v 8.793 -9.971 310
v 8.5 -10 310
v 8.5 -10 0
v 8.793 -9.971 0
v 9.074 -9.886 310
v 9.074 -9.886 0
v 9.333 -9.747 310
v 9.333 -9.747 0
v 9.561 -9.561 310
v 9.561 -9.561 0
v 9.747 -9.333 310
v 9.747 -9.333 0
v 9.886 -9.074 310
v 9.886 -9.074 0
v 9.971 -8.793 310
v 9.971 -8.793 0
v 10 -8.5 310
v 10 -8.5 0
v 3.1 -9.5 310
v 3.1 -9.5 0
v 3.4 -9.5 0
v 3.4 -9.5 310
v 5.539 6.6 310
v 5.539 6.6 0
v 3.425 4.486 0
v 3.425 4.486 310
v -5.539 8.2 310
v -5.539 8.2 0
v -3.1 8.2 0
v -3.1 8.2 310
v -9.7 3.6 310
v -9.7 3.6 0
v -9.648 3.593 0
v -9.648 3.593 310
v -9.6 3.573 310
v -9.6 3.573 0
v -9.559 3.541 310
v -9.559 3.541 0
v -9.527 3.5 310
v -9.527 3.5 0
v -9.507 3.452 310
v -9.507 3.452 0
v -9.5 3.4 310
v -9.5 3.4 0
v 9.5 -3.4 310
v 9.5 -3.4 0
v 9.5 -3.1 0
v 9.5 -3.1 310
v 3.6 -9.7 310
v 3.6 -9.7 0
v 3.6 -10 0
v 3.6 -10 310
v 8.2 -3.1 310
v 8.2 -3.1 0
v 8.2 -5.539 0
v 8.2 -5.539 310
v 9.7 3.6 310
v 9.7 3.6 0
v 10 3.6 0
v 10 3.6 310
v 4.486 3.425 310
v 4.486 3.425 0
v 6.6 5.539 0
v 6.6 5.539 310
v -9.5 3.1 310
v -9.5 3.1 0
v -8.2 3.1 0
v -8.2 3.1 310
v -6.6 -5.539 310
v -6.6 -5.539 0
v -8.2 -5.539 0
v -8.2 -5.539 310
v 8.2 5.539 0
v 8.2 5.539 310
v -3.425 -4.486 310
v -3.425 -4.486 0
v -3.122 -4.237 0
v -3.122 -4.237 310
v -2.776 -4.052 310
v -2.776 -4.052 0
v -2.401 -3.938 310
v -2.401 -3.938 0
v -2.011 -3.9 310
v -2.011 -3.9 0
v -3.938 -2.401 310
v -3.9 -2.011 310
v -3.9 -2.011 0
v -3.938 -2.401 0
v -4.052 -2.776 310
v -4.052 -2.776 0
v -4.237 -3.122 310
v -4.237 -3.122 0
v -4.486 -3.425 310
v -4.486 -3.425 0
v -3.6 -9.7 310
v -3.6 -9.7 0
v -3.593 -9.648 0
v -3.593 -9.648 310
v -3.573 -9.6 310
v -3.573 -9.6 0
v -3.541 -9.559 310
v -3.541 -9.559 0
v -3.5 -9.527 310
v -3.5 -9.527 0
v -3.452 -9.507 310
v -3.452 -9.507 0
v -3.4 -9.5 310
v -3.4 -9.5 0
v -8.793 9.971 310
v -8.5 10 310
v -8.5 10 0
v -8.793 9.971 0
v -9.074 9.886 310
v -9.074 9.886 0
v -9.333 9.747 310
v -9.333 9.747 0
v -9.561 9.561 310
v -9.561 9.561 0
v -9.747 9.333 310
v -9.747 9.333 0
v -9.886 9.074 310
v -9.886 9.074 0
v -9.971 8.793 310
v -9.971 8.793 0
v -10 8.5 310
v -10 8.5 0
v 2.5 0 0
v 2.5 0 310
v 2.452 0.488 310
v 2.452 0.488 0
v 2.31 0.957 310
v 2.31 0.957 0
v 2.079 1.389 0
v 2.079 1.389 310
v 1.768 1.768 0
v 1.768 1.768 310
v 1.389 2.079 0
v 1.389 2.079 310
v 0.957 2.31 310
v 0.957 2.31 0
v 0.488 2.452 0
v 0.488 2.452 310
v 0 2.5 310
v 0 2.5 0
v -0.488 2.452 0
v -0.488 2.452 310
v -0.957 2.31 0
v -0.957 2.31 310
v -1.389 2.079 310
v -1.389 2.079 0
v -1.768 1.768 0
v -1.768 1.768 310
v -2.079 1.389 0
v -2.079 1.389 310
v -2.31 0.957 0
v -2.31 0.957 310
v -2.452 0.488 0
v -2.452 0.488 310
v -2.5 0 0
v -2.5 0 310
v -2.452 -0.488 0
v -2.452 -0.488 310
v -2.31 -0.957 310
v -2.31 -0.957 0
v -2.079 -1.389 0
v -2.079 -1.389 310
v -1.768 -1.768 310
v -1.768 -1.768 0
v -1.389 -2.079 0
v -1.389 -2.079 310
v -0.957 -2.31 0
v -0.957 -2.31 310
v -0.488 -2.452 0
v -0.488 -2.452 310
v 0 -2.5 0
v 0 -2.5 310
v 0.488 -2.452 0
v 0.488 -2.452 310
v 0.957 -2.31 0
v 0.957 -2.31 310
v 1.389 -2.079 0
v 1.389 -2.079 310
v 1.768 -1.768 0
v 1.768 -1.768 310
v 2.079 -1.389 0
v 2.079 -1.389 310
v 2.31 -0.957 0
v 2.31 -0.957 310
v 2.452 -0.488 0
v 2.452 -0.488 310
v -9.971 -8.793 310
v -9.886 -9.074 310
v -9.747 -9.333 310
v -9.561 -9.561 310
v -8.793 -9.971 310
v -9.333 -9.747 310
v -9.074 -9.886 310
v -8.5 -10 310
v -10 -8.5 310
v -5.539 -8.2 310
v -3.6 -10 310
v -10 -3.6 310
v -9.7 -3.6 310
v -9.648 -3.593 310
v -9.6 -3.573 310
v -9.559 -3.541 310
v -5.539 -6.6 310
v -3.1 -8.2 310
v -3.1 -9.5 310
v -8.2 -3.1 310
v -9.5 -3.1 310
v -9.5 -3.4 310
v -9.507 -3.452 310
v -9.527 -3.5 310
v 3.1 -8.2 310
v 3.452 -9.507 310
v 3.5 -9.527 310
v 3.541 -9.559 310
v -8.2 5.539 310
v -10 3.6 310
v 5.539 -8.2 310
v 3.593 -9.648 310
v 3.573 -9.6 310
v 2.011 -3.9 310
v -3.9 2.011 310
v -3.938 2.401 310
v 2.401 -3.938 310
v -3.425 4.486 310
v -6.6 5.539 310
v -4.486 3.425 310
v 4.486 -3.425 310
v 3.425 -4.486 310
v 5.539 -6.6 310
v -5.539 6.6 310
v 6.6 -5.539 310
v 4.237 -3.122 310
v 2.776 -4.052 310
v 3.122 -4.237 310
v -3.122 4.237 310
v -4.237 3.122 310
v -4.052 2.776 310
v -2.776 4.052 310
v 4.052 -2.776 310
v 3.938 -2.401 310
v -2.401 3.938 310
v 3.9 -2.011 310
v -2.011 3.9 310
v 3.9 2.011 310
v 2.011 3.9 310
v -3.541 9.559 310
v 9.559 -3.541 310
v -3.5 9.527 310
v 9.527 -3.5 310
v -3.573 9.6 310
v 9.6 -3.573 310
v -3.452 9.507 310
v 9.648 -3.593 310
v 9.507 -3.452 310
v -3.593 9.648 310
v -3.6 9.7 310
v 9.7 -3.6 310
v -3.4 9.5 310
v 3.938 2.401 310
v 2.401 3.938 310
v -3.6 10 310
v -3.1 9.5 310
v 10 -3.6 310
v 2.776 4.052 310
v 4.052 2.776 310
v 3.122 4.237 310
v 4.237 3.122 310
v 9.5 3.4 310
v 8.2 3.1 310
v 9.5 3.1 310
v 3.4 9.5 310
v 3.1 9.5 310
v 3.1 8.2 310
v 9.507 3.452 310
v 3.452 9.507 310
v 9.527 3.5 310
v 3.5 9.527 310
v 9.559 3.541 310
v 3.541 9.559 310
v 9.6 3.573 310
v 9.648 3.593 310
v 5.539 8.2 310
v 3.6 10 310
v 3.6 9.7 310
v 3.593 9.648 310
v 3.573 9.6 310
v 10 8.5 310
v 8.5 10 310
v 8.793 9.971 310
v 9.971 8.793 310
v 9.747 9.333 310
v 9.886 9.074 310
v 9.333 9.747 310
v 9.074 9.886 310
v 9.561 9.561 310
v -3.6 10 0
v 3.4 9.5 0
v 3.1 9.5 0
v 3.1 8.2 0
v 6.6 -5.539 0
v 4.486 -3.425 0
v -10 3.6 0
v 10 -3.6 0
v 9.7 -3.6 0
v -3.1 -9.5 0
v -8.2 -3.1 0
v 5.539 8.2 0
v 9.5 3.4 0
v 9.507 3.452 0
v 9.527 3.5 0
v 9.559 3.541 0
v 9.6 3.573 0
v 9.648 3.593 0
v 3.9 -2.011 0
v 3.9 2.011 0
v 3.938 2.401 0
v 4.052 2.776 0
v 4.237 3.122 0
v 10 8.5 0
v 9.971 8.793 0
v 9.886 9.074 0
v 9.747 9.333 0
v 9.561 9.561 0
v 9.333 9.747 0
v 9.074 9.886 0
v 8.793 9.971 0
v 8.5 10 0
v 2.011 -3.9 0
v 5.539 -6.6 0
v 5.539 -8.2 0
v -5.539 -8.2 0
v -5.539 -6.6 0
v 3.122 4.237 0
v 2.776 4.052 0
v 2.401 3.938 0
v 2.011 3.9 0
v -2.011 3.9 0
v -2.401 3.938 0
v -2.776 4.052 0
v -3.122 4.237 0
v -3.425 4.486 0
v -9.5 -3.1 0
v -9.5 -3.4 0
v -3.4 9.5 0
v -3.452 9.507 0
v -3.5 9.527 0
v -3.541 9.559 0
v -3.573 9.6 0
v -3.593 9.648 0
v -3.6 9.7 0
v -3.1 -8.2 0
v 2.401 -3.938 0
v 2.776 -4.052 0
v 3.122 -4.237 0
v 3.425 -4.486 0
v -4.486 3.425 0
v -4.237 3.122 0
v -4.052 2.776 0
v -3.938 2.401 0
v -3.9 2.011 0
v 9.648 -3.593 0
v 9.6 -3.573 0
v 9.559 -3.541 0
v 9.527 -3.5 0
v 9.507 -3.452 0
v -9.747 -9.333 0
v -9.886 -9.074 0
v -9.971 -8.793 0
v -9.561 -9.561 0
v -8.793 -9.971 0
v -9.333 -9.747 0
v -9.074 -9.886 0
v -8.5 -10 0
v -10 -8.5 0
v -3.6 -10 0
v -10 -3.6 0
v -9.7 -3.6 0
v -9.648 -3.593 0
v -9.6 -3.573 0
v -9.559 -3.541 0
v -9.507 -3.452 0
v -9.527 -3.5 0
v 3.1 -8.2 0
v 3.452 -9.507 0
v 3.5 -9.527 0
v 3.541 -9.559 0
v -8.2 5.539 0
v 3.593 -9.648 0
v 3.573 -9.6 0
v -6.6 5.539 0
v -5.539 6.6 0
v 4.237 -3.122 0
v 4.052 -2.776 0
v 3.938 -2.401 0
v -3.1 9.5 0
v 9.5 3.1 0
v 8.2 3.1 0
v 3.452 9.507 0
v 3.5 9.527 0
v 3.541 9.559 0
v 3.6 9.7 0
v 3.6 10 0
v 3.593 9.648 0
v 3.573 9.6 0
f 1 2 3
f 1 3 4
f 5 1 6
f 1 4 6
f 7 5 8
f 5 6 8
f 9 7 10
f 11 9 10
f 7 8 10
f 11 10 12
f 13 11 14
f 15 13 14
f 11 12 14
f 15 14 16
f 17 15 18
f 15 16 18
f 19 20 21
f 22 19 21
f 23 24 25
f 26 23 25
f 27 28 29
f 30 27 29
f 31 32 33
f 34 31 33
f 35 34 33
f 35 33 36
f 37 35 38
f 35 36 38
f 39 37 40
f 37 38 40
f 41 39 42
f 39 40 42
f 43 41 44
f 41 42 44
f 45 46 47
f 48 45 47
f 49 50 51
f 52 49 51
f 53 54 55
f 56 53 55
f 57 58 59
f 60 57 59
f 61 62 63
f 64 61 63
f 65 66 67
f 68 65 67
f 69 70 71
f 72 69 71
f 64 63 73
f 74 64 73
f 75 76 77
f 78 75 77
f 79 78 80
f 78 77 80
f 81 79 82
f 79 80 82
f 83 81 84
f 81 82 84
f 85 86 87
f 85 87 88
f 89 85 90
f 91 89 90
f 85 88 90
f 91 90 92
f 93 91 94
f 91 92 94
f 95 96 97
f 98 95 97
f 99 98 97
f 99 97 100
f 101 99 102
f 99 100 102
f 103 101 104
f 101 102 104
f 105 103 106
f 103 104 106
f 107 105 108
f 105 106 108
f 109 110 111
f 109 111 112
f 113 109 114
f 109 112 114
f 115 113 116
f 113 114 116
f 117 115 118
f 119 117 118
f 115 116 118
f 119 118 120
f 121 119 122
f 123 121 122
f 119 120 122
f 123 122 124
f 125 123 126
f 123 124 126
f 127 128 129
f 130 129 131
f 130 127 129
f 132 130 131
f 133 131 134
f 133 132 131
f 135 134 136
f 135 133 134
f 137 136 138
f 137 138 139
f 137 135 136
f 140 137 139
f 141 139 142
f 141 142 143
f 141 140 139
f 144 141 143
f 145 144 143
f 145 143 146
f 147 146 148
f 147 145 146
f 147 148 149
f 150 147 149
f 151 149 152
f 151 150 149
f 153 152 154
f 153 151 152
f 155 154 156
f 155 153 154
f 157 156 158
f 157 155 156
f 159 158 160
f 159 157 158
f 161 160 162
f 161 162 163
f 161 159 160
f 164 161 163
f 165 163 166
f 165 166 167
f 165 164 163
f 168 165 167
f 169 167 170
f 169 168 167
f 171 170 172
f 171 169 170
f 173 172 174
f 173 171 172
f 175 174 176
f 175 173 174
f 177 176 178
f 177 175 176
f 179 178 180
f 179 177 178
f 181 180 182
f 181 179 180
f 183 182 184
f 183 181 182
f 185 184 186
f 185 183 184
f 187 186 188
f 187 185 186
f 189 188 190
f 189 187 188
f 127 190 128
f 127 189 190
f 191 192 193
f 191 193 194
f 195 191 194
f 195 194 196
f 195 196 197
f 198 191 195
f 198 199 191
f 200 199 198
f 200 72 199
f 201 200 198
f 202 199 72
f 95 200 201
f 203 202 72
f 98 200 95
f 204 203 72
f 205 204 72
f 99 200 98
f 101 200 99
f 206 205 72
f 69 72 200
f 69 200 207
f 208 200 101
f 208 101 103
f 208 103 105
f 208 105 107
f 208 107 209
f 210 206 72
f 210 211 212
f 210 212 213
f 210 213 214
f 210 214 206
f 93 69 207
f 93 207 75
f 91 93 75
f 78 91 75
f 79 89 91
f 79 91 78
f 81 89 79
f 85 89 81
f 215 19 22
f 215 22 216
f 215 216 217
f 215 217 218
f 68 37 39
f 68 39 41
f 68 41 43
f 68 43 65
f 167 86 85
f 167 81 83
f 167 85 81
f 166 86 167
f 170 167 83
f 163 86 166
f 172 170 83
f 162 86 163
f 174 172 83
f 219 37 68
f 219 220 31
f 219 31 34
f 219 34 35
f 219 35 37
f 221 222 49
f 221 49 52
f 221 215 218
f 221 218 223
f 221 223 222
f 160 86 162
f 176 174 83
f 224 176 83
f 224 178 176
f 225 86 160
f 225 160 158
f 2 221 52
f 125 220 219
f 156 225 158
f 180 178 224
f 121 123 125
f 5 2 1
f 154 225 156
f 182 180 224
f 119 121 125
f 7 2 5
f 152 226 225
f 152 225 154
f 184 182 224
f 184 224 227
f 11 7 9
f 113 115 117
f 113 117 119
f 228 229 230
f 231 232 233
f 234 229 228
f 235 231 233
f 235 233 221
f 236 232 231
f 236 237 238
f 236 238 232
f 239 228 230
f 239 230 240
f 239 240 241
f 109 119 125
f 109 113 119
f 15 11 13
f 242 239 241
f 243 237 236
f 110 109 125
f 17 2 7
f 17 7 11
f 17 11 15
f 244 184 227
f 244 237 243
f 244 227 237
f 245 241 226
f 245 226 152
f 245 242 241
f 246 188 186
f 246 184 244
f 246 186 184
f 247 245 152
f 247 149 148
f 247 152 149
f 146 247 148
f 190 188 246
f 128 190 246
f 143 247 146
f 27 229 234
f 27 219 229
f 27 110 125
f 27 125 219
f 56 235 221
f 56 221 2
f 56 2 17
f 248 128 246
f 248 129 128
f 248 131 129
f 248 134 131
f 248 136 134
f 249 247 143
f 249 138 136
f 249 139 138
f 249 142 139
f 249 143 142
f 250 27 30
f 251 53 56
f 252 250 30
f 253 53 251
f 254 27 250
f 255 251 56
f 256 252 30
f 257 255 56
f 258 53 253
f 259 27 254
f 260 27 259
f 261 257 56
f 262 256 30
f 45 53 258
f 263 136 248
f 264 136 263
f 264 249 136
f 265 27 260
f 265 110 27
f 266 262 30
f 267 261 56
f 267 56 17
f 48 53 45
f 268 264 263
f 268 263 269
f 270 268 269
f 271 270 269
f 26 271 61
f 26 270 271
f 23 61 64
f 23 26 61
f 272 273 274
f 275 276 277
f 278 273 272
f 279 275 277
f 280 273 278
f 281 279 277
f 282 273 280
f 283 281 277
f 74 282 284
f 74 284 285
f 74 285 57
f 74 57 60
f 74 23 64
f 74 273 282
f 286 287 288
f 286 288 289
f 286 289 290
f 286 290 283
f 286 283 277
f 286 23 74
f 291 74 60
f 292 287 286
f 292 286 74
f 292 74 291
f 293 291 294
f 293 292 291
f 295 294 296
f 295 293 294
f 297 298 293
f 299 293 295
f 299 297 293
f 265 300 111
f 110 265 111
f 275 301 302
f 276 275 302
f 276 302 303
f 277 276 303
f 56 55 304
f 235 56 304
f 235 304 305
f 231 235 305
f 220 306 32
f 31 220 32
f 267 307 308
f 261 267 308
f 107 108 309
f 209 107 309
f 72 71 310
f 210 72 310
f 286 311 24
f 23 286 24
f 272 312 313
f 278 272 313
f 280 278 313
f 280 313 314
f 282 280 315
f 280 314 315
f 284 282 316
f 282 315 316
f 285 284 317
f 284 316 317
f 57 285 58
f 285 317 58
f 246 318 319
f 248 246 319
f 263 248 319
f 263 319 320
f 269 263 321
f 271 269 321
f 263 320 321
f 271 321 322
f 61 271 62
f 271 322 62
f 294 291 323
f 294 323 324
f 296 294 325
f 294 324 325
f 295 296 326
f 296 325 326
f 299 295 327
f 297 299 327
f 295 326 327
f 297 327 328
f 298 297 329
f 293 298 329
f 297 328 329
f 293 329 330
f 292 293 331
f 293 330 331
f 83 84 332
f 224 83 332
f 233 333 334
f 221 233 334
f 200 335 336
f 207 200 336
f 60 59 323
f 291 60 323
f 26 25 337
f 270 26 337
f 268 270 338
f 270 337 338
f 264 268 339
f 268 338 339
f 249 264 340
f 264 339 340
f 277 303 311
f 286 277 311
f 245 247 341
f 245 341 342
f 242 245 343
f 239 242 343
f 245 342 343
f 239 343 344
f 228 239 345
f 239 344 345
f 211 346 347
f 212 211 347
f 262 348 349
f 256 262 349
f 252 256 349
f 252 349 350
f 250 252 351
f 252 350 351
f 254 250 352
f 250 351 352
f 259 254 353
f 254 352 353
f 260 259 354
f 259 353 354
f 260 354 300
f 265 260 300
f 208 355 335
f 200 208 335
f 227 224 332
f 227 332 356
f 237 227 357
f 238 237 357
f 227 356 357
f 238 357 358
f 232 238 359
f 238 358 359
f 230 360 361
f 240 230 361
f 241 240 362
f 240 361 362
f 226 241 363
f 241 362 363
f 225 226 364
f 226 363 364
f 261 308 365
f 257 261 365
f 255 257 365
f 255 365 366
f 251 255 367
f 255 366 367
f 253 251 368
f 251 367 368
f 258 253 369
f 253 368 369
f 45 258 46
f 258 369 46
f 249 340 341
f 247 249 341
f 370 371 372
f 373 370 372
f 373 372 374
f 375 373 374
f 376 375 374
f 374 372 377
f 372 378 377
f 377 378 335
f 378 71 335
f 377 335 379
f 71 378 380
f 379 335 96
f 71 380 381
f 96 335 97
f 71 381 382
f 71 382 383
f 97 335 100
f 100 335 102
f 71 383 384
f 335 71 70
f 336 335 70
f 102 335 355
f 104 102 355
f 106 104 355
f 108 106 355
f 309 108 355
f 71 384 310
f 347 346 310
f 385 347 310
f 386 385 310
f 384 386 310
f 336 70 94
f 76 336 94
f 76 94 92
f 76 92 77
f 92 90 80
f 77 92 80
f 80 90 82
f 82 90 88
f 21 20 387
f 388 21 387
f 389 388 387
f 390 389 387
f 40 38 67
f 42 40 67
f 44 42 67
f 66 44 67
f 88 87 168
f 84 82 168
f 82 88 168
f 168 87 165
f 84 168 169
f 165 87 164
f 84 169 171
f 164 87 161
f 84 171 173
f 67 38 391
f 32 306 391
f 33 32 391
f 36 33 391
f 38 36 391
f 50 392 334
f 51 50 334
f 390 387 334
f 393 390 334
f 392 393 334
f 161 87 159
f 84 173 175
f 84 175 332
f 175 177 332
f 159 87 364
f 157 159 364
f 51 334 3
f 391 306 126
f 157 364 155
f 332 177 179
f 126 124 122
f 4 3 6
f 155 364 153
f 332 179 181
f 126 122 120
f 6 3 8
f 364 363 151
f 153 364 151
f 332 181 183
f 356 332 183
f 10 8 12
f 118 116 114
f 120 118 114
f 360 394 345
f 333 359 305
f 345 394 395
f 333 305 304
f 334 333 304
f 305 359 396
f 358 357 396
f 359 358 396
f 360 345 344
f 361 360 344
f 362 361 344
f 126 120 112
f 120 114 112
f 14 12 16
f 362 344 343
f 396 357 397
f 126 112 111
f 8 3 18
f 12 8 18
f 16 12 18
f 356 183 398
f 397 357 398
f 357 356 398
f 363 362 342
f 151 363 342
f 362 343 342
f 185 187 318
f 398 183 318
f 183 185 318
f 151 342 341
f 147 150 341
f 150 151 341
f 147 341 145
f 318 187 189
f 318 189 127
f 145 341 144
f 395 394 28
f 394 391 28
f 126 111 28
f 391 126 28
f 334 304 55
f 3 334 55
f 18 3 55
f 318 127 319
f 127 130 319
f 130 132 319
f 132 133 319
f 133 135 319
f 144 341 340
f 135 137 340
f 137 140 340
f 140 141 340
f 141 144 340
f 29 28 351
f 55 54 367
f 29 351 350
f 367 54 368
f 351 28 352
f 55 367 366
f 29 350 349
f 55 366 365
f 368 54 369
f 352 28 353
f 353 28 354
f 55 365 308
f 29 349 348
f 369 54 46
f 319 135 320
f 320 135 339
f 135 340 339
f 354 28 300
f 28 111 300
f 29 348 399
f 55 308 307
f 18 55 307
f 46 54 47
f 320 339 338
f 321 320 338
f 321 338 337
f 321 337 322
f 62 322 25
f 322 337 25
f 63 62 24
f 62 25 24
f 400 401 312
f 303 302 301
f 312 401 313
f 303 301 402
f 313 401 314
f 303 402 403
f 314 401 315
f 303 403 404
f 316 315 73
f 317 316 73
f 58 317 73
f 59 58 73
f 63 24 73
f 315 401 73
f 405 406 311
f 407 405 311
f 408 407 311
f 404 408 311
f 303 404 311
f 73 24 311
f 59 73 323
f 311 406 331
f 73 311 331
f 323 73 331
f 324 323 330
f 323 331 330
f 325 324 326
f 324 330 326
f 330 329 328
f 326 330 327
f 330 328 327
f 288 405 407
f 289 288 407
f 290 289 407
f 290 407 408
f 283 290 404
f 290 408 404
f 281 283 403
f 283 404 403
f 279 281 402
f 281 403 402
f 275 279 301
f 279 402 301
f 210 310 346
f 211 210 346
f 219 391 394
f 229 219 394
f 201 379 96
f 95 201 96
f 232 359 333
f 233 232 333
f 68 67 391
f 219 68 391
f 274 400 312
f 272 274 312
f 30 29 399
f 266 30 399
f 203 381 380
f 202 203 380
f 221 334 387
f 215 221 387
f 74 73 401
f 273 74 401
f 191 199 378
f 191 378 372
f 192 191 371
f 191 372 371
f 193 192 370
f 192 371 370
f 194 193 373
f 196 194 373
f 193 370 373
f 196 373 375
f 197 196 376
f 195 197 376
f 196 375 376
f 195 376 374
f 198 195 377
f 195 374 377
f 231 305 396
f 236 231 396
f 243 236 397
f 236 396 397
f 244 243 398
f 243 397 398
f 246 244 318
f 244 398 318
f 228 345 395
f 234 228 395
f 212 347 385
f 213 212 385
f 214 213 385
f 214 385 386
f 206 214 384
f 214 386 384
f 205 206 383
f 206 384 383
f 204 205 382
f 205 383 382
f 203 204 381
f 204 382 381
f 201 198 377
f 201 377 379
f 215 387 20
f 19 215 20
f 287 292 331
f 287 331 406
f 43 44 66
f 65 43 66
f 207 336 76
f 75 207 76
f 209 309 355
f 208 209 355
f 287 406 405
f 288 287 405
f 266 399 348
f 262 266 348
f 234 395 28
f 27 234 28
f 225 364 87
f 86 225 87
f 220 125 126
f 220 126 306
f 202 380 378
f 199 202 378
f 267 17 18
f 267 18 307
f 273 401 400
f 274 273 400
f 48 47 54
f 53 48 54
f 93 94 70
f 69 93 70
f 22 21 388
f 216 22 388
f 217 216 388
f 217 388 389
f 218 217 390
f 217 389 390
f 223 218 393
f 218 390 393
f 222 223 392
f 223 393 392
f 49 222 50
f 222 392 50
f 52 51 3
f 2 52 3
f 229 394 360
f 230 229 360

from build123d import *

# Parameters (mm, degrees)
SKETCH1_R       = 2.5
EXTRUDE_1_DEPTH = 310


with BuildPart() as part:
    # Sketch1 → Бобышка-Вытянуть1 (new body)
    with BuildSketch(Plane.XY):
        with BuildLine():
            Line((0, 3.9), (-2.010912703, 3.9))
            ThreePointArc((-2.010912703, 3.9), (-2.776279568, 4.052240935), (-3.425126266, 4.485786438))
            Line((-3.425126266, 4.485786438), (-5.539339828, 6.6))
            Line((-5.539339828, 6.6), (-5.539339828, 8.2))
            Line((-5.539339828, 8.2), (-3.1, 8.2))
            Line((-3.1, 8.2), (-3.1, 9.5))
            Line((-3.1, 9.5), (-3.4, 9.5))
            ThreePointArc((-3.4, 9.5), (-3.541421356, 9.558578644), (-3.6, 9.7))
            Line((-3.6, 9.7), (-3.6, 10))
            Line((-3.6, 10), (-8.5, 10))
            ThreePointArc((-8.5, 10), (-9.560660172, 9.560660172), (-10, 8.5))
            Line((-10, 8.5), (-10, 3.6))
            Line((-10, 3.6), (-9.7, 3.6))
            ThreePointArc((-9.7, 3.6), (-9.558578644, 3.541421356), (-9.5, 3.4))
            Line((-9.5, 3.4), (-9.5, 3.1))
            Line((-9.5, 3.1), (-8.2, 3.1))
            Line((-8.2, 3.1), (-8.2, 5.539339828))
            Line((-8.2, 5.539339828), (-6.6, 5.539339828))
            Line((-6.6, 5.539339828), (-4.485786438, 3.425126266))
            ThreePointArc((-4.485786438, 3.425126266), (-4.052240935, 2.776279568), (-3.9, 2.010912703))
            Line((-3.9, 2.010912703), (-3.9, 0))
            Line((-3.9, 0), (-3.9, -2.010912703))
            ThreePointArc((-3.9, -2.010912703), (-4.052240935, -2.776279568), (-4.485786438, -3.425126266))
            Line((-4.485786438, -3.425126266), (-6.6, -5.539339828))
            Line((-6.6, -5.539339828), (-8.2, -5.539339828))
            Line((-8.2, -5.539339828), (-8.2, -3.1))
            Line((-8.2, -3.1), (-9.5, -3.1))
            Line((-9.5, -3.1), (-9.5, -3.4))
            ThreePointArc((-9.5, -3.4), (-9.558578644, -3.541421356), (-9.7, -3.6))
            Line((-9.7, -3.6), (-10, -3.6))
            Line((-10, -3.6), (-10, -8.5))
            ThreePointArc((-10, -8.5), (-9.560660172, -9.560660172), (-8.5, -10))
            Line((-8.5, -10), (-3.6, -10))
            Line((-3.6, -10), (-3.6, -9.7))
            ThreePointArc((-3.6, -9.7), (-3.541421356, -9.558578644), (-3.4, -9.5))
            Line((-3.4, -9.5), (-3.1, -9.5))
            Line((-3.1, -9.5), (-3.1, -8.2))
            Line((-3.1, -8.2), (-5.539339828, -8.2))
            Line((-5.539339828, -8.2), (-5.539339828, -6.6))
            Line((-5.539339828, -6.6), (-3.425126266, -4.485786438))
            ThreePointArc((-3.425126266, -4.485786438), (-2.776279568, -4.052240935), (-2.010912703, -3.9))
            Line((-2.010912703, -3.9), (0, -3.9))
            Line((0, -3.9), (2.010912703, -3.9))
            ThreePointArc((2.010912703, -3.9), (2.776279568, -4.052240935), (3.425126266, -4.485786438))
            Line((3.425126266, -4.485786438), (5.539339828, -6.6))
            Line((5.539339828, -6.6), (5.539339828, -8.2))
            Line((5.539339828, -8.2), (3.1, -8.2))
            Line((3.1, -8.2), (3.1, -9.5))
            Line((3.1, -9.5), (3.4, -9.5))
            ThreePointArc((3.4, -9.5), (3.541421356, -9.558578644), (3.6, -9.7))
            Line((3.6, -9.7), (3.6, -10))
            Line((3.6, -10), (8.5, -10))
            ThreePointArc((8.5, -10), (9.560660172, -9.560660172), (10, -8.5))
            Line((10, -8.5), (10, -3.6))
            Line((10, -3.6), (9.7, -3.6))
            ThreePointArc((9.7, -3.6), (9.558578644, -3.541421356), (9.5, -3.4))
            Line((9.5, -3.4), (9.5, -3.1))
            Line((9.5, -3.1), (8.2, -3.1))
            Line((8.2, -3.1), (8.2, -5.539339828))
            Line((8.2, -5.539339828), (6.6, -5.539339828))
            Line((6.6, -5.539339828), (4.485786438, -3.425126266))
            ThreePointArc((4.485786438, -3.425126266), (4.052240935, -2.776279568), (3.9, -2.010912703))
            Line((3.9, -2.010912703), (3.9, 0))
            Line((3.9, 0), (3.9, 2.010912703))
            ThreePointArc((3.9, 2.010912703), (4.052240935, 2.776279568), (4.485786438, 3.425126266))
            Line((4.485786438, 3.425126266), (6.6, 5.539339828))
            Line((6.6, 5.539339828), (8.2, 5.539339828))
            Line((8.2, 5.539339828), (8.2, 3.1))
            Line((8.2, 3.1), (9.5, 3.1))
            Line((9.5, 3.1), (9.5, 3.4))
            ThreePointArc((9.5, 3.4), (9.558578644, 3.541421356), (9.7, 3.6))
            Line((9.7, 3.6), (10, 3.6))
            Line((10, 3.6), (10, 8.5))
            ThreePointArc((10, 8.5), (9.560660172, 9.560660172), (8.5, 10))
            Line((8.5, 10), (3.6, 10))
            Line((3.6, 10), (3.6, 9.7))
            ThreePointArc((3.6, 9.7), (3.541421356, 9.558578644), (3.4, 9.5))
            Line((3.4, 9.5), (3.1, 9.5))
            Line((3.1, 9.5), (3.1, 8.2))
            Line((3.1, 8.2), (5.539339828, 8.2))
            Line((5.539339828, 8.2), (5.539339828, 6.6))
            Line((5.539339828, 6.6), (3.425126266, 4.485786438))
            ThreePointArc((3.425126266, 4.485786438), (2.776279568, 4.052240935), (2.010912703, 3.9))
            Line((2.010912703, 3.9), (0, 3.9))
        make_face()
        Circle(SKETCH1_R, mode=Mode.SUBTRACT)
    extrude(amount=EXTRUDE_1_DEPTH)


solid = part.part
